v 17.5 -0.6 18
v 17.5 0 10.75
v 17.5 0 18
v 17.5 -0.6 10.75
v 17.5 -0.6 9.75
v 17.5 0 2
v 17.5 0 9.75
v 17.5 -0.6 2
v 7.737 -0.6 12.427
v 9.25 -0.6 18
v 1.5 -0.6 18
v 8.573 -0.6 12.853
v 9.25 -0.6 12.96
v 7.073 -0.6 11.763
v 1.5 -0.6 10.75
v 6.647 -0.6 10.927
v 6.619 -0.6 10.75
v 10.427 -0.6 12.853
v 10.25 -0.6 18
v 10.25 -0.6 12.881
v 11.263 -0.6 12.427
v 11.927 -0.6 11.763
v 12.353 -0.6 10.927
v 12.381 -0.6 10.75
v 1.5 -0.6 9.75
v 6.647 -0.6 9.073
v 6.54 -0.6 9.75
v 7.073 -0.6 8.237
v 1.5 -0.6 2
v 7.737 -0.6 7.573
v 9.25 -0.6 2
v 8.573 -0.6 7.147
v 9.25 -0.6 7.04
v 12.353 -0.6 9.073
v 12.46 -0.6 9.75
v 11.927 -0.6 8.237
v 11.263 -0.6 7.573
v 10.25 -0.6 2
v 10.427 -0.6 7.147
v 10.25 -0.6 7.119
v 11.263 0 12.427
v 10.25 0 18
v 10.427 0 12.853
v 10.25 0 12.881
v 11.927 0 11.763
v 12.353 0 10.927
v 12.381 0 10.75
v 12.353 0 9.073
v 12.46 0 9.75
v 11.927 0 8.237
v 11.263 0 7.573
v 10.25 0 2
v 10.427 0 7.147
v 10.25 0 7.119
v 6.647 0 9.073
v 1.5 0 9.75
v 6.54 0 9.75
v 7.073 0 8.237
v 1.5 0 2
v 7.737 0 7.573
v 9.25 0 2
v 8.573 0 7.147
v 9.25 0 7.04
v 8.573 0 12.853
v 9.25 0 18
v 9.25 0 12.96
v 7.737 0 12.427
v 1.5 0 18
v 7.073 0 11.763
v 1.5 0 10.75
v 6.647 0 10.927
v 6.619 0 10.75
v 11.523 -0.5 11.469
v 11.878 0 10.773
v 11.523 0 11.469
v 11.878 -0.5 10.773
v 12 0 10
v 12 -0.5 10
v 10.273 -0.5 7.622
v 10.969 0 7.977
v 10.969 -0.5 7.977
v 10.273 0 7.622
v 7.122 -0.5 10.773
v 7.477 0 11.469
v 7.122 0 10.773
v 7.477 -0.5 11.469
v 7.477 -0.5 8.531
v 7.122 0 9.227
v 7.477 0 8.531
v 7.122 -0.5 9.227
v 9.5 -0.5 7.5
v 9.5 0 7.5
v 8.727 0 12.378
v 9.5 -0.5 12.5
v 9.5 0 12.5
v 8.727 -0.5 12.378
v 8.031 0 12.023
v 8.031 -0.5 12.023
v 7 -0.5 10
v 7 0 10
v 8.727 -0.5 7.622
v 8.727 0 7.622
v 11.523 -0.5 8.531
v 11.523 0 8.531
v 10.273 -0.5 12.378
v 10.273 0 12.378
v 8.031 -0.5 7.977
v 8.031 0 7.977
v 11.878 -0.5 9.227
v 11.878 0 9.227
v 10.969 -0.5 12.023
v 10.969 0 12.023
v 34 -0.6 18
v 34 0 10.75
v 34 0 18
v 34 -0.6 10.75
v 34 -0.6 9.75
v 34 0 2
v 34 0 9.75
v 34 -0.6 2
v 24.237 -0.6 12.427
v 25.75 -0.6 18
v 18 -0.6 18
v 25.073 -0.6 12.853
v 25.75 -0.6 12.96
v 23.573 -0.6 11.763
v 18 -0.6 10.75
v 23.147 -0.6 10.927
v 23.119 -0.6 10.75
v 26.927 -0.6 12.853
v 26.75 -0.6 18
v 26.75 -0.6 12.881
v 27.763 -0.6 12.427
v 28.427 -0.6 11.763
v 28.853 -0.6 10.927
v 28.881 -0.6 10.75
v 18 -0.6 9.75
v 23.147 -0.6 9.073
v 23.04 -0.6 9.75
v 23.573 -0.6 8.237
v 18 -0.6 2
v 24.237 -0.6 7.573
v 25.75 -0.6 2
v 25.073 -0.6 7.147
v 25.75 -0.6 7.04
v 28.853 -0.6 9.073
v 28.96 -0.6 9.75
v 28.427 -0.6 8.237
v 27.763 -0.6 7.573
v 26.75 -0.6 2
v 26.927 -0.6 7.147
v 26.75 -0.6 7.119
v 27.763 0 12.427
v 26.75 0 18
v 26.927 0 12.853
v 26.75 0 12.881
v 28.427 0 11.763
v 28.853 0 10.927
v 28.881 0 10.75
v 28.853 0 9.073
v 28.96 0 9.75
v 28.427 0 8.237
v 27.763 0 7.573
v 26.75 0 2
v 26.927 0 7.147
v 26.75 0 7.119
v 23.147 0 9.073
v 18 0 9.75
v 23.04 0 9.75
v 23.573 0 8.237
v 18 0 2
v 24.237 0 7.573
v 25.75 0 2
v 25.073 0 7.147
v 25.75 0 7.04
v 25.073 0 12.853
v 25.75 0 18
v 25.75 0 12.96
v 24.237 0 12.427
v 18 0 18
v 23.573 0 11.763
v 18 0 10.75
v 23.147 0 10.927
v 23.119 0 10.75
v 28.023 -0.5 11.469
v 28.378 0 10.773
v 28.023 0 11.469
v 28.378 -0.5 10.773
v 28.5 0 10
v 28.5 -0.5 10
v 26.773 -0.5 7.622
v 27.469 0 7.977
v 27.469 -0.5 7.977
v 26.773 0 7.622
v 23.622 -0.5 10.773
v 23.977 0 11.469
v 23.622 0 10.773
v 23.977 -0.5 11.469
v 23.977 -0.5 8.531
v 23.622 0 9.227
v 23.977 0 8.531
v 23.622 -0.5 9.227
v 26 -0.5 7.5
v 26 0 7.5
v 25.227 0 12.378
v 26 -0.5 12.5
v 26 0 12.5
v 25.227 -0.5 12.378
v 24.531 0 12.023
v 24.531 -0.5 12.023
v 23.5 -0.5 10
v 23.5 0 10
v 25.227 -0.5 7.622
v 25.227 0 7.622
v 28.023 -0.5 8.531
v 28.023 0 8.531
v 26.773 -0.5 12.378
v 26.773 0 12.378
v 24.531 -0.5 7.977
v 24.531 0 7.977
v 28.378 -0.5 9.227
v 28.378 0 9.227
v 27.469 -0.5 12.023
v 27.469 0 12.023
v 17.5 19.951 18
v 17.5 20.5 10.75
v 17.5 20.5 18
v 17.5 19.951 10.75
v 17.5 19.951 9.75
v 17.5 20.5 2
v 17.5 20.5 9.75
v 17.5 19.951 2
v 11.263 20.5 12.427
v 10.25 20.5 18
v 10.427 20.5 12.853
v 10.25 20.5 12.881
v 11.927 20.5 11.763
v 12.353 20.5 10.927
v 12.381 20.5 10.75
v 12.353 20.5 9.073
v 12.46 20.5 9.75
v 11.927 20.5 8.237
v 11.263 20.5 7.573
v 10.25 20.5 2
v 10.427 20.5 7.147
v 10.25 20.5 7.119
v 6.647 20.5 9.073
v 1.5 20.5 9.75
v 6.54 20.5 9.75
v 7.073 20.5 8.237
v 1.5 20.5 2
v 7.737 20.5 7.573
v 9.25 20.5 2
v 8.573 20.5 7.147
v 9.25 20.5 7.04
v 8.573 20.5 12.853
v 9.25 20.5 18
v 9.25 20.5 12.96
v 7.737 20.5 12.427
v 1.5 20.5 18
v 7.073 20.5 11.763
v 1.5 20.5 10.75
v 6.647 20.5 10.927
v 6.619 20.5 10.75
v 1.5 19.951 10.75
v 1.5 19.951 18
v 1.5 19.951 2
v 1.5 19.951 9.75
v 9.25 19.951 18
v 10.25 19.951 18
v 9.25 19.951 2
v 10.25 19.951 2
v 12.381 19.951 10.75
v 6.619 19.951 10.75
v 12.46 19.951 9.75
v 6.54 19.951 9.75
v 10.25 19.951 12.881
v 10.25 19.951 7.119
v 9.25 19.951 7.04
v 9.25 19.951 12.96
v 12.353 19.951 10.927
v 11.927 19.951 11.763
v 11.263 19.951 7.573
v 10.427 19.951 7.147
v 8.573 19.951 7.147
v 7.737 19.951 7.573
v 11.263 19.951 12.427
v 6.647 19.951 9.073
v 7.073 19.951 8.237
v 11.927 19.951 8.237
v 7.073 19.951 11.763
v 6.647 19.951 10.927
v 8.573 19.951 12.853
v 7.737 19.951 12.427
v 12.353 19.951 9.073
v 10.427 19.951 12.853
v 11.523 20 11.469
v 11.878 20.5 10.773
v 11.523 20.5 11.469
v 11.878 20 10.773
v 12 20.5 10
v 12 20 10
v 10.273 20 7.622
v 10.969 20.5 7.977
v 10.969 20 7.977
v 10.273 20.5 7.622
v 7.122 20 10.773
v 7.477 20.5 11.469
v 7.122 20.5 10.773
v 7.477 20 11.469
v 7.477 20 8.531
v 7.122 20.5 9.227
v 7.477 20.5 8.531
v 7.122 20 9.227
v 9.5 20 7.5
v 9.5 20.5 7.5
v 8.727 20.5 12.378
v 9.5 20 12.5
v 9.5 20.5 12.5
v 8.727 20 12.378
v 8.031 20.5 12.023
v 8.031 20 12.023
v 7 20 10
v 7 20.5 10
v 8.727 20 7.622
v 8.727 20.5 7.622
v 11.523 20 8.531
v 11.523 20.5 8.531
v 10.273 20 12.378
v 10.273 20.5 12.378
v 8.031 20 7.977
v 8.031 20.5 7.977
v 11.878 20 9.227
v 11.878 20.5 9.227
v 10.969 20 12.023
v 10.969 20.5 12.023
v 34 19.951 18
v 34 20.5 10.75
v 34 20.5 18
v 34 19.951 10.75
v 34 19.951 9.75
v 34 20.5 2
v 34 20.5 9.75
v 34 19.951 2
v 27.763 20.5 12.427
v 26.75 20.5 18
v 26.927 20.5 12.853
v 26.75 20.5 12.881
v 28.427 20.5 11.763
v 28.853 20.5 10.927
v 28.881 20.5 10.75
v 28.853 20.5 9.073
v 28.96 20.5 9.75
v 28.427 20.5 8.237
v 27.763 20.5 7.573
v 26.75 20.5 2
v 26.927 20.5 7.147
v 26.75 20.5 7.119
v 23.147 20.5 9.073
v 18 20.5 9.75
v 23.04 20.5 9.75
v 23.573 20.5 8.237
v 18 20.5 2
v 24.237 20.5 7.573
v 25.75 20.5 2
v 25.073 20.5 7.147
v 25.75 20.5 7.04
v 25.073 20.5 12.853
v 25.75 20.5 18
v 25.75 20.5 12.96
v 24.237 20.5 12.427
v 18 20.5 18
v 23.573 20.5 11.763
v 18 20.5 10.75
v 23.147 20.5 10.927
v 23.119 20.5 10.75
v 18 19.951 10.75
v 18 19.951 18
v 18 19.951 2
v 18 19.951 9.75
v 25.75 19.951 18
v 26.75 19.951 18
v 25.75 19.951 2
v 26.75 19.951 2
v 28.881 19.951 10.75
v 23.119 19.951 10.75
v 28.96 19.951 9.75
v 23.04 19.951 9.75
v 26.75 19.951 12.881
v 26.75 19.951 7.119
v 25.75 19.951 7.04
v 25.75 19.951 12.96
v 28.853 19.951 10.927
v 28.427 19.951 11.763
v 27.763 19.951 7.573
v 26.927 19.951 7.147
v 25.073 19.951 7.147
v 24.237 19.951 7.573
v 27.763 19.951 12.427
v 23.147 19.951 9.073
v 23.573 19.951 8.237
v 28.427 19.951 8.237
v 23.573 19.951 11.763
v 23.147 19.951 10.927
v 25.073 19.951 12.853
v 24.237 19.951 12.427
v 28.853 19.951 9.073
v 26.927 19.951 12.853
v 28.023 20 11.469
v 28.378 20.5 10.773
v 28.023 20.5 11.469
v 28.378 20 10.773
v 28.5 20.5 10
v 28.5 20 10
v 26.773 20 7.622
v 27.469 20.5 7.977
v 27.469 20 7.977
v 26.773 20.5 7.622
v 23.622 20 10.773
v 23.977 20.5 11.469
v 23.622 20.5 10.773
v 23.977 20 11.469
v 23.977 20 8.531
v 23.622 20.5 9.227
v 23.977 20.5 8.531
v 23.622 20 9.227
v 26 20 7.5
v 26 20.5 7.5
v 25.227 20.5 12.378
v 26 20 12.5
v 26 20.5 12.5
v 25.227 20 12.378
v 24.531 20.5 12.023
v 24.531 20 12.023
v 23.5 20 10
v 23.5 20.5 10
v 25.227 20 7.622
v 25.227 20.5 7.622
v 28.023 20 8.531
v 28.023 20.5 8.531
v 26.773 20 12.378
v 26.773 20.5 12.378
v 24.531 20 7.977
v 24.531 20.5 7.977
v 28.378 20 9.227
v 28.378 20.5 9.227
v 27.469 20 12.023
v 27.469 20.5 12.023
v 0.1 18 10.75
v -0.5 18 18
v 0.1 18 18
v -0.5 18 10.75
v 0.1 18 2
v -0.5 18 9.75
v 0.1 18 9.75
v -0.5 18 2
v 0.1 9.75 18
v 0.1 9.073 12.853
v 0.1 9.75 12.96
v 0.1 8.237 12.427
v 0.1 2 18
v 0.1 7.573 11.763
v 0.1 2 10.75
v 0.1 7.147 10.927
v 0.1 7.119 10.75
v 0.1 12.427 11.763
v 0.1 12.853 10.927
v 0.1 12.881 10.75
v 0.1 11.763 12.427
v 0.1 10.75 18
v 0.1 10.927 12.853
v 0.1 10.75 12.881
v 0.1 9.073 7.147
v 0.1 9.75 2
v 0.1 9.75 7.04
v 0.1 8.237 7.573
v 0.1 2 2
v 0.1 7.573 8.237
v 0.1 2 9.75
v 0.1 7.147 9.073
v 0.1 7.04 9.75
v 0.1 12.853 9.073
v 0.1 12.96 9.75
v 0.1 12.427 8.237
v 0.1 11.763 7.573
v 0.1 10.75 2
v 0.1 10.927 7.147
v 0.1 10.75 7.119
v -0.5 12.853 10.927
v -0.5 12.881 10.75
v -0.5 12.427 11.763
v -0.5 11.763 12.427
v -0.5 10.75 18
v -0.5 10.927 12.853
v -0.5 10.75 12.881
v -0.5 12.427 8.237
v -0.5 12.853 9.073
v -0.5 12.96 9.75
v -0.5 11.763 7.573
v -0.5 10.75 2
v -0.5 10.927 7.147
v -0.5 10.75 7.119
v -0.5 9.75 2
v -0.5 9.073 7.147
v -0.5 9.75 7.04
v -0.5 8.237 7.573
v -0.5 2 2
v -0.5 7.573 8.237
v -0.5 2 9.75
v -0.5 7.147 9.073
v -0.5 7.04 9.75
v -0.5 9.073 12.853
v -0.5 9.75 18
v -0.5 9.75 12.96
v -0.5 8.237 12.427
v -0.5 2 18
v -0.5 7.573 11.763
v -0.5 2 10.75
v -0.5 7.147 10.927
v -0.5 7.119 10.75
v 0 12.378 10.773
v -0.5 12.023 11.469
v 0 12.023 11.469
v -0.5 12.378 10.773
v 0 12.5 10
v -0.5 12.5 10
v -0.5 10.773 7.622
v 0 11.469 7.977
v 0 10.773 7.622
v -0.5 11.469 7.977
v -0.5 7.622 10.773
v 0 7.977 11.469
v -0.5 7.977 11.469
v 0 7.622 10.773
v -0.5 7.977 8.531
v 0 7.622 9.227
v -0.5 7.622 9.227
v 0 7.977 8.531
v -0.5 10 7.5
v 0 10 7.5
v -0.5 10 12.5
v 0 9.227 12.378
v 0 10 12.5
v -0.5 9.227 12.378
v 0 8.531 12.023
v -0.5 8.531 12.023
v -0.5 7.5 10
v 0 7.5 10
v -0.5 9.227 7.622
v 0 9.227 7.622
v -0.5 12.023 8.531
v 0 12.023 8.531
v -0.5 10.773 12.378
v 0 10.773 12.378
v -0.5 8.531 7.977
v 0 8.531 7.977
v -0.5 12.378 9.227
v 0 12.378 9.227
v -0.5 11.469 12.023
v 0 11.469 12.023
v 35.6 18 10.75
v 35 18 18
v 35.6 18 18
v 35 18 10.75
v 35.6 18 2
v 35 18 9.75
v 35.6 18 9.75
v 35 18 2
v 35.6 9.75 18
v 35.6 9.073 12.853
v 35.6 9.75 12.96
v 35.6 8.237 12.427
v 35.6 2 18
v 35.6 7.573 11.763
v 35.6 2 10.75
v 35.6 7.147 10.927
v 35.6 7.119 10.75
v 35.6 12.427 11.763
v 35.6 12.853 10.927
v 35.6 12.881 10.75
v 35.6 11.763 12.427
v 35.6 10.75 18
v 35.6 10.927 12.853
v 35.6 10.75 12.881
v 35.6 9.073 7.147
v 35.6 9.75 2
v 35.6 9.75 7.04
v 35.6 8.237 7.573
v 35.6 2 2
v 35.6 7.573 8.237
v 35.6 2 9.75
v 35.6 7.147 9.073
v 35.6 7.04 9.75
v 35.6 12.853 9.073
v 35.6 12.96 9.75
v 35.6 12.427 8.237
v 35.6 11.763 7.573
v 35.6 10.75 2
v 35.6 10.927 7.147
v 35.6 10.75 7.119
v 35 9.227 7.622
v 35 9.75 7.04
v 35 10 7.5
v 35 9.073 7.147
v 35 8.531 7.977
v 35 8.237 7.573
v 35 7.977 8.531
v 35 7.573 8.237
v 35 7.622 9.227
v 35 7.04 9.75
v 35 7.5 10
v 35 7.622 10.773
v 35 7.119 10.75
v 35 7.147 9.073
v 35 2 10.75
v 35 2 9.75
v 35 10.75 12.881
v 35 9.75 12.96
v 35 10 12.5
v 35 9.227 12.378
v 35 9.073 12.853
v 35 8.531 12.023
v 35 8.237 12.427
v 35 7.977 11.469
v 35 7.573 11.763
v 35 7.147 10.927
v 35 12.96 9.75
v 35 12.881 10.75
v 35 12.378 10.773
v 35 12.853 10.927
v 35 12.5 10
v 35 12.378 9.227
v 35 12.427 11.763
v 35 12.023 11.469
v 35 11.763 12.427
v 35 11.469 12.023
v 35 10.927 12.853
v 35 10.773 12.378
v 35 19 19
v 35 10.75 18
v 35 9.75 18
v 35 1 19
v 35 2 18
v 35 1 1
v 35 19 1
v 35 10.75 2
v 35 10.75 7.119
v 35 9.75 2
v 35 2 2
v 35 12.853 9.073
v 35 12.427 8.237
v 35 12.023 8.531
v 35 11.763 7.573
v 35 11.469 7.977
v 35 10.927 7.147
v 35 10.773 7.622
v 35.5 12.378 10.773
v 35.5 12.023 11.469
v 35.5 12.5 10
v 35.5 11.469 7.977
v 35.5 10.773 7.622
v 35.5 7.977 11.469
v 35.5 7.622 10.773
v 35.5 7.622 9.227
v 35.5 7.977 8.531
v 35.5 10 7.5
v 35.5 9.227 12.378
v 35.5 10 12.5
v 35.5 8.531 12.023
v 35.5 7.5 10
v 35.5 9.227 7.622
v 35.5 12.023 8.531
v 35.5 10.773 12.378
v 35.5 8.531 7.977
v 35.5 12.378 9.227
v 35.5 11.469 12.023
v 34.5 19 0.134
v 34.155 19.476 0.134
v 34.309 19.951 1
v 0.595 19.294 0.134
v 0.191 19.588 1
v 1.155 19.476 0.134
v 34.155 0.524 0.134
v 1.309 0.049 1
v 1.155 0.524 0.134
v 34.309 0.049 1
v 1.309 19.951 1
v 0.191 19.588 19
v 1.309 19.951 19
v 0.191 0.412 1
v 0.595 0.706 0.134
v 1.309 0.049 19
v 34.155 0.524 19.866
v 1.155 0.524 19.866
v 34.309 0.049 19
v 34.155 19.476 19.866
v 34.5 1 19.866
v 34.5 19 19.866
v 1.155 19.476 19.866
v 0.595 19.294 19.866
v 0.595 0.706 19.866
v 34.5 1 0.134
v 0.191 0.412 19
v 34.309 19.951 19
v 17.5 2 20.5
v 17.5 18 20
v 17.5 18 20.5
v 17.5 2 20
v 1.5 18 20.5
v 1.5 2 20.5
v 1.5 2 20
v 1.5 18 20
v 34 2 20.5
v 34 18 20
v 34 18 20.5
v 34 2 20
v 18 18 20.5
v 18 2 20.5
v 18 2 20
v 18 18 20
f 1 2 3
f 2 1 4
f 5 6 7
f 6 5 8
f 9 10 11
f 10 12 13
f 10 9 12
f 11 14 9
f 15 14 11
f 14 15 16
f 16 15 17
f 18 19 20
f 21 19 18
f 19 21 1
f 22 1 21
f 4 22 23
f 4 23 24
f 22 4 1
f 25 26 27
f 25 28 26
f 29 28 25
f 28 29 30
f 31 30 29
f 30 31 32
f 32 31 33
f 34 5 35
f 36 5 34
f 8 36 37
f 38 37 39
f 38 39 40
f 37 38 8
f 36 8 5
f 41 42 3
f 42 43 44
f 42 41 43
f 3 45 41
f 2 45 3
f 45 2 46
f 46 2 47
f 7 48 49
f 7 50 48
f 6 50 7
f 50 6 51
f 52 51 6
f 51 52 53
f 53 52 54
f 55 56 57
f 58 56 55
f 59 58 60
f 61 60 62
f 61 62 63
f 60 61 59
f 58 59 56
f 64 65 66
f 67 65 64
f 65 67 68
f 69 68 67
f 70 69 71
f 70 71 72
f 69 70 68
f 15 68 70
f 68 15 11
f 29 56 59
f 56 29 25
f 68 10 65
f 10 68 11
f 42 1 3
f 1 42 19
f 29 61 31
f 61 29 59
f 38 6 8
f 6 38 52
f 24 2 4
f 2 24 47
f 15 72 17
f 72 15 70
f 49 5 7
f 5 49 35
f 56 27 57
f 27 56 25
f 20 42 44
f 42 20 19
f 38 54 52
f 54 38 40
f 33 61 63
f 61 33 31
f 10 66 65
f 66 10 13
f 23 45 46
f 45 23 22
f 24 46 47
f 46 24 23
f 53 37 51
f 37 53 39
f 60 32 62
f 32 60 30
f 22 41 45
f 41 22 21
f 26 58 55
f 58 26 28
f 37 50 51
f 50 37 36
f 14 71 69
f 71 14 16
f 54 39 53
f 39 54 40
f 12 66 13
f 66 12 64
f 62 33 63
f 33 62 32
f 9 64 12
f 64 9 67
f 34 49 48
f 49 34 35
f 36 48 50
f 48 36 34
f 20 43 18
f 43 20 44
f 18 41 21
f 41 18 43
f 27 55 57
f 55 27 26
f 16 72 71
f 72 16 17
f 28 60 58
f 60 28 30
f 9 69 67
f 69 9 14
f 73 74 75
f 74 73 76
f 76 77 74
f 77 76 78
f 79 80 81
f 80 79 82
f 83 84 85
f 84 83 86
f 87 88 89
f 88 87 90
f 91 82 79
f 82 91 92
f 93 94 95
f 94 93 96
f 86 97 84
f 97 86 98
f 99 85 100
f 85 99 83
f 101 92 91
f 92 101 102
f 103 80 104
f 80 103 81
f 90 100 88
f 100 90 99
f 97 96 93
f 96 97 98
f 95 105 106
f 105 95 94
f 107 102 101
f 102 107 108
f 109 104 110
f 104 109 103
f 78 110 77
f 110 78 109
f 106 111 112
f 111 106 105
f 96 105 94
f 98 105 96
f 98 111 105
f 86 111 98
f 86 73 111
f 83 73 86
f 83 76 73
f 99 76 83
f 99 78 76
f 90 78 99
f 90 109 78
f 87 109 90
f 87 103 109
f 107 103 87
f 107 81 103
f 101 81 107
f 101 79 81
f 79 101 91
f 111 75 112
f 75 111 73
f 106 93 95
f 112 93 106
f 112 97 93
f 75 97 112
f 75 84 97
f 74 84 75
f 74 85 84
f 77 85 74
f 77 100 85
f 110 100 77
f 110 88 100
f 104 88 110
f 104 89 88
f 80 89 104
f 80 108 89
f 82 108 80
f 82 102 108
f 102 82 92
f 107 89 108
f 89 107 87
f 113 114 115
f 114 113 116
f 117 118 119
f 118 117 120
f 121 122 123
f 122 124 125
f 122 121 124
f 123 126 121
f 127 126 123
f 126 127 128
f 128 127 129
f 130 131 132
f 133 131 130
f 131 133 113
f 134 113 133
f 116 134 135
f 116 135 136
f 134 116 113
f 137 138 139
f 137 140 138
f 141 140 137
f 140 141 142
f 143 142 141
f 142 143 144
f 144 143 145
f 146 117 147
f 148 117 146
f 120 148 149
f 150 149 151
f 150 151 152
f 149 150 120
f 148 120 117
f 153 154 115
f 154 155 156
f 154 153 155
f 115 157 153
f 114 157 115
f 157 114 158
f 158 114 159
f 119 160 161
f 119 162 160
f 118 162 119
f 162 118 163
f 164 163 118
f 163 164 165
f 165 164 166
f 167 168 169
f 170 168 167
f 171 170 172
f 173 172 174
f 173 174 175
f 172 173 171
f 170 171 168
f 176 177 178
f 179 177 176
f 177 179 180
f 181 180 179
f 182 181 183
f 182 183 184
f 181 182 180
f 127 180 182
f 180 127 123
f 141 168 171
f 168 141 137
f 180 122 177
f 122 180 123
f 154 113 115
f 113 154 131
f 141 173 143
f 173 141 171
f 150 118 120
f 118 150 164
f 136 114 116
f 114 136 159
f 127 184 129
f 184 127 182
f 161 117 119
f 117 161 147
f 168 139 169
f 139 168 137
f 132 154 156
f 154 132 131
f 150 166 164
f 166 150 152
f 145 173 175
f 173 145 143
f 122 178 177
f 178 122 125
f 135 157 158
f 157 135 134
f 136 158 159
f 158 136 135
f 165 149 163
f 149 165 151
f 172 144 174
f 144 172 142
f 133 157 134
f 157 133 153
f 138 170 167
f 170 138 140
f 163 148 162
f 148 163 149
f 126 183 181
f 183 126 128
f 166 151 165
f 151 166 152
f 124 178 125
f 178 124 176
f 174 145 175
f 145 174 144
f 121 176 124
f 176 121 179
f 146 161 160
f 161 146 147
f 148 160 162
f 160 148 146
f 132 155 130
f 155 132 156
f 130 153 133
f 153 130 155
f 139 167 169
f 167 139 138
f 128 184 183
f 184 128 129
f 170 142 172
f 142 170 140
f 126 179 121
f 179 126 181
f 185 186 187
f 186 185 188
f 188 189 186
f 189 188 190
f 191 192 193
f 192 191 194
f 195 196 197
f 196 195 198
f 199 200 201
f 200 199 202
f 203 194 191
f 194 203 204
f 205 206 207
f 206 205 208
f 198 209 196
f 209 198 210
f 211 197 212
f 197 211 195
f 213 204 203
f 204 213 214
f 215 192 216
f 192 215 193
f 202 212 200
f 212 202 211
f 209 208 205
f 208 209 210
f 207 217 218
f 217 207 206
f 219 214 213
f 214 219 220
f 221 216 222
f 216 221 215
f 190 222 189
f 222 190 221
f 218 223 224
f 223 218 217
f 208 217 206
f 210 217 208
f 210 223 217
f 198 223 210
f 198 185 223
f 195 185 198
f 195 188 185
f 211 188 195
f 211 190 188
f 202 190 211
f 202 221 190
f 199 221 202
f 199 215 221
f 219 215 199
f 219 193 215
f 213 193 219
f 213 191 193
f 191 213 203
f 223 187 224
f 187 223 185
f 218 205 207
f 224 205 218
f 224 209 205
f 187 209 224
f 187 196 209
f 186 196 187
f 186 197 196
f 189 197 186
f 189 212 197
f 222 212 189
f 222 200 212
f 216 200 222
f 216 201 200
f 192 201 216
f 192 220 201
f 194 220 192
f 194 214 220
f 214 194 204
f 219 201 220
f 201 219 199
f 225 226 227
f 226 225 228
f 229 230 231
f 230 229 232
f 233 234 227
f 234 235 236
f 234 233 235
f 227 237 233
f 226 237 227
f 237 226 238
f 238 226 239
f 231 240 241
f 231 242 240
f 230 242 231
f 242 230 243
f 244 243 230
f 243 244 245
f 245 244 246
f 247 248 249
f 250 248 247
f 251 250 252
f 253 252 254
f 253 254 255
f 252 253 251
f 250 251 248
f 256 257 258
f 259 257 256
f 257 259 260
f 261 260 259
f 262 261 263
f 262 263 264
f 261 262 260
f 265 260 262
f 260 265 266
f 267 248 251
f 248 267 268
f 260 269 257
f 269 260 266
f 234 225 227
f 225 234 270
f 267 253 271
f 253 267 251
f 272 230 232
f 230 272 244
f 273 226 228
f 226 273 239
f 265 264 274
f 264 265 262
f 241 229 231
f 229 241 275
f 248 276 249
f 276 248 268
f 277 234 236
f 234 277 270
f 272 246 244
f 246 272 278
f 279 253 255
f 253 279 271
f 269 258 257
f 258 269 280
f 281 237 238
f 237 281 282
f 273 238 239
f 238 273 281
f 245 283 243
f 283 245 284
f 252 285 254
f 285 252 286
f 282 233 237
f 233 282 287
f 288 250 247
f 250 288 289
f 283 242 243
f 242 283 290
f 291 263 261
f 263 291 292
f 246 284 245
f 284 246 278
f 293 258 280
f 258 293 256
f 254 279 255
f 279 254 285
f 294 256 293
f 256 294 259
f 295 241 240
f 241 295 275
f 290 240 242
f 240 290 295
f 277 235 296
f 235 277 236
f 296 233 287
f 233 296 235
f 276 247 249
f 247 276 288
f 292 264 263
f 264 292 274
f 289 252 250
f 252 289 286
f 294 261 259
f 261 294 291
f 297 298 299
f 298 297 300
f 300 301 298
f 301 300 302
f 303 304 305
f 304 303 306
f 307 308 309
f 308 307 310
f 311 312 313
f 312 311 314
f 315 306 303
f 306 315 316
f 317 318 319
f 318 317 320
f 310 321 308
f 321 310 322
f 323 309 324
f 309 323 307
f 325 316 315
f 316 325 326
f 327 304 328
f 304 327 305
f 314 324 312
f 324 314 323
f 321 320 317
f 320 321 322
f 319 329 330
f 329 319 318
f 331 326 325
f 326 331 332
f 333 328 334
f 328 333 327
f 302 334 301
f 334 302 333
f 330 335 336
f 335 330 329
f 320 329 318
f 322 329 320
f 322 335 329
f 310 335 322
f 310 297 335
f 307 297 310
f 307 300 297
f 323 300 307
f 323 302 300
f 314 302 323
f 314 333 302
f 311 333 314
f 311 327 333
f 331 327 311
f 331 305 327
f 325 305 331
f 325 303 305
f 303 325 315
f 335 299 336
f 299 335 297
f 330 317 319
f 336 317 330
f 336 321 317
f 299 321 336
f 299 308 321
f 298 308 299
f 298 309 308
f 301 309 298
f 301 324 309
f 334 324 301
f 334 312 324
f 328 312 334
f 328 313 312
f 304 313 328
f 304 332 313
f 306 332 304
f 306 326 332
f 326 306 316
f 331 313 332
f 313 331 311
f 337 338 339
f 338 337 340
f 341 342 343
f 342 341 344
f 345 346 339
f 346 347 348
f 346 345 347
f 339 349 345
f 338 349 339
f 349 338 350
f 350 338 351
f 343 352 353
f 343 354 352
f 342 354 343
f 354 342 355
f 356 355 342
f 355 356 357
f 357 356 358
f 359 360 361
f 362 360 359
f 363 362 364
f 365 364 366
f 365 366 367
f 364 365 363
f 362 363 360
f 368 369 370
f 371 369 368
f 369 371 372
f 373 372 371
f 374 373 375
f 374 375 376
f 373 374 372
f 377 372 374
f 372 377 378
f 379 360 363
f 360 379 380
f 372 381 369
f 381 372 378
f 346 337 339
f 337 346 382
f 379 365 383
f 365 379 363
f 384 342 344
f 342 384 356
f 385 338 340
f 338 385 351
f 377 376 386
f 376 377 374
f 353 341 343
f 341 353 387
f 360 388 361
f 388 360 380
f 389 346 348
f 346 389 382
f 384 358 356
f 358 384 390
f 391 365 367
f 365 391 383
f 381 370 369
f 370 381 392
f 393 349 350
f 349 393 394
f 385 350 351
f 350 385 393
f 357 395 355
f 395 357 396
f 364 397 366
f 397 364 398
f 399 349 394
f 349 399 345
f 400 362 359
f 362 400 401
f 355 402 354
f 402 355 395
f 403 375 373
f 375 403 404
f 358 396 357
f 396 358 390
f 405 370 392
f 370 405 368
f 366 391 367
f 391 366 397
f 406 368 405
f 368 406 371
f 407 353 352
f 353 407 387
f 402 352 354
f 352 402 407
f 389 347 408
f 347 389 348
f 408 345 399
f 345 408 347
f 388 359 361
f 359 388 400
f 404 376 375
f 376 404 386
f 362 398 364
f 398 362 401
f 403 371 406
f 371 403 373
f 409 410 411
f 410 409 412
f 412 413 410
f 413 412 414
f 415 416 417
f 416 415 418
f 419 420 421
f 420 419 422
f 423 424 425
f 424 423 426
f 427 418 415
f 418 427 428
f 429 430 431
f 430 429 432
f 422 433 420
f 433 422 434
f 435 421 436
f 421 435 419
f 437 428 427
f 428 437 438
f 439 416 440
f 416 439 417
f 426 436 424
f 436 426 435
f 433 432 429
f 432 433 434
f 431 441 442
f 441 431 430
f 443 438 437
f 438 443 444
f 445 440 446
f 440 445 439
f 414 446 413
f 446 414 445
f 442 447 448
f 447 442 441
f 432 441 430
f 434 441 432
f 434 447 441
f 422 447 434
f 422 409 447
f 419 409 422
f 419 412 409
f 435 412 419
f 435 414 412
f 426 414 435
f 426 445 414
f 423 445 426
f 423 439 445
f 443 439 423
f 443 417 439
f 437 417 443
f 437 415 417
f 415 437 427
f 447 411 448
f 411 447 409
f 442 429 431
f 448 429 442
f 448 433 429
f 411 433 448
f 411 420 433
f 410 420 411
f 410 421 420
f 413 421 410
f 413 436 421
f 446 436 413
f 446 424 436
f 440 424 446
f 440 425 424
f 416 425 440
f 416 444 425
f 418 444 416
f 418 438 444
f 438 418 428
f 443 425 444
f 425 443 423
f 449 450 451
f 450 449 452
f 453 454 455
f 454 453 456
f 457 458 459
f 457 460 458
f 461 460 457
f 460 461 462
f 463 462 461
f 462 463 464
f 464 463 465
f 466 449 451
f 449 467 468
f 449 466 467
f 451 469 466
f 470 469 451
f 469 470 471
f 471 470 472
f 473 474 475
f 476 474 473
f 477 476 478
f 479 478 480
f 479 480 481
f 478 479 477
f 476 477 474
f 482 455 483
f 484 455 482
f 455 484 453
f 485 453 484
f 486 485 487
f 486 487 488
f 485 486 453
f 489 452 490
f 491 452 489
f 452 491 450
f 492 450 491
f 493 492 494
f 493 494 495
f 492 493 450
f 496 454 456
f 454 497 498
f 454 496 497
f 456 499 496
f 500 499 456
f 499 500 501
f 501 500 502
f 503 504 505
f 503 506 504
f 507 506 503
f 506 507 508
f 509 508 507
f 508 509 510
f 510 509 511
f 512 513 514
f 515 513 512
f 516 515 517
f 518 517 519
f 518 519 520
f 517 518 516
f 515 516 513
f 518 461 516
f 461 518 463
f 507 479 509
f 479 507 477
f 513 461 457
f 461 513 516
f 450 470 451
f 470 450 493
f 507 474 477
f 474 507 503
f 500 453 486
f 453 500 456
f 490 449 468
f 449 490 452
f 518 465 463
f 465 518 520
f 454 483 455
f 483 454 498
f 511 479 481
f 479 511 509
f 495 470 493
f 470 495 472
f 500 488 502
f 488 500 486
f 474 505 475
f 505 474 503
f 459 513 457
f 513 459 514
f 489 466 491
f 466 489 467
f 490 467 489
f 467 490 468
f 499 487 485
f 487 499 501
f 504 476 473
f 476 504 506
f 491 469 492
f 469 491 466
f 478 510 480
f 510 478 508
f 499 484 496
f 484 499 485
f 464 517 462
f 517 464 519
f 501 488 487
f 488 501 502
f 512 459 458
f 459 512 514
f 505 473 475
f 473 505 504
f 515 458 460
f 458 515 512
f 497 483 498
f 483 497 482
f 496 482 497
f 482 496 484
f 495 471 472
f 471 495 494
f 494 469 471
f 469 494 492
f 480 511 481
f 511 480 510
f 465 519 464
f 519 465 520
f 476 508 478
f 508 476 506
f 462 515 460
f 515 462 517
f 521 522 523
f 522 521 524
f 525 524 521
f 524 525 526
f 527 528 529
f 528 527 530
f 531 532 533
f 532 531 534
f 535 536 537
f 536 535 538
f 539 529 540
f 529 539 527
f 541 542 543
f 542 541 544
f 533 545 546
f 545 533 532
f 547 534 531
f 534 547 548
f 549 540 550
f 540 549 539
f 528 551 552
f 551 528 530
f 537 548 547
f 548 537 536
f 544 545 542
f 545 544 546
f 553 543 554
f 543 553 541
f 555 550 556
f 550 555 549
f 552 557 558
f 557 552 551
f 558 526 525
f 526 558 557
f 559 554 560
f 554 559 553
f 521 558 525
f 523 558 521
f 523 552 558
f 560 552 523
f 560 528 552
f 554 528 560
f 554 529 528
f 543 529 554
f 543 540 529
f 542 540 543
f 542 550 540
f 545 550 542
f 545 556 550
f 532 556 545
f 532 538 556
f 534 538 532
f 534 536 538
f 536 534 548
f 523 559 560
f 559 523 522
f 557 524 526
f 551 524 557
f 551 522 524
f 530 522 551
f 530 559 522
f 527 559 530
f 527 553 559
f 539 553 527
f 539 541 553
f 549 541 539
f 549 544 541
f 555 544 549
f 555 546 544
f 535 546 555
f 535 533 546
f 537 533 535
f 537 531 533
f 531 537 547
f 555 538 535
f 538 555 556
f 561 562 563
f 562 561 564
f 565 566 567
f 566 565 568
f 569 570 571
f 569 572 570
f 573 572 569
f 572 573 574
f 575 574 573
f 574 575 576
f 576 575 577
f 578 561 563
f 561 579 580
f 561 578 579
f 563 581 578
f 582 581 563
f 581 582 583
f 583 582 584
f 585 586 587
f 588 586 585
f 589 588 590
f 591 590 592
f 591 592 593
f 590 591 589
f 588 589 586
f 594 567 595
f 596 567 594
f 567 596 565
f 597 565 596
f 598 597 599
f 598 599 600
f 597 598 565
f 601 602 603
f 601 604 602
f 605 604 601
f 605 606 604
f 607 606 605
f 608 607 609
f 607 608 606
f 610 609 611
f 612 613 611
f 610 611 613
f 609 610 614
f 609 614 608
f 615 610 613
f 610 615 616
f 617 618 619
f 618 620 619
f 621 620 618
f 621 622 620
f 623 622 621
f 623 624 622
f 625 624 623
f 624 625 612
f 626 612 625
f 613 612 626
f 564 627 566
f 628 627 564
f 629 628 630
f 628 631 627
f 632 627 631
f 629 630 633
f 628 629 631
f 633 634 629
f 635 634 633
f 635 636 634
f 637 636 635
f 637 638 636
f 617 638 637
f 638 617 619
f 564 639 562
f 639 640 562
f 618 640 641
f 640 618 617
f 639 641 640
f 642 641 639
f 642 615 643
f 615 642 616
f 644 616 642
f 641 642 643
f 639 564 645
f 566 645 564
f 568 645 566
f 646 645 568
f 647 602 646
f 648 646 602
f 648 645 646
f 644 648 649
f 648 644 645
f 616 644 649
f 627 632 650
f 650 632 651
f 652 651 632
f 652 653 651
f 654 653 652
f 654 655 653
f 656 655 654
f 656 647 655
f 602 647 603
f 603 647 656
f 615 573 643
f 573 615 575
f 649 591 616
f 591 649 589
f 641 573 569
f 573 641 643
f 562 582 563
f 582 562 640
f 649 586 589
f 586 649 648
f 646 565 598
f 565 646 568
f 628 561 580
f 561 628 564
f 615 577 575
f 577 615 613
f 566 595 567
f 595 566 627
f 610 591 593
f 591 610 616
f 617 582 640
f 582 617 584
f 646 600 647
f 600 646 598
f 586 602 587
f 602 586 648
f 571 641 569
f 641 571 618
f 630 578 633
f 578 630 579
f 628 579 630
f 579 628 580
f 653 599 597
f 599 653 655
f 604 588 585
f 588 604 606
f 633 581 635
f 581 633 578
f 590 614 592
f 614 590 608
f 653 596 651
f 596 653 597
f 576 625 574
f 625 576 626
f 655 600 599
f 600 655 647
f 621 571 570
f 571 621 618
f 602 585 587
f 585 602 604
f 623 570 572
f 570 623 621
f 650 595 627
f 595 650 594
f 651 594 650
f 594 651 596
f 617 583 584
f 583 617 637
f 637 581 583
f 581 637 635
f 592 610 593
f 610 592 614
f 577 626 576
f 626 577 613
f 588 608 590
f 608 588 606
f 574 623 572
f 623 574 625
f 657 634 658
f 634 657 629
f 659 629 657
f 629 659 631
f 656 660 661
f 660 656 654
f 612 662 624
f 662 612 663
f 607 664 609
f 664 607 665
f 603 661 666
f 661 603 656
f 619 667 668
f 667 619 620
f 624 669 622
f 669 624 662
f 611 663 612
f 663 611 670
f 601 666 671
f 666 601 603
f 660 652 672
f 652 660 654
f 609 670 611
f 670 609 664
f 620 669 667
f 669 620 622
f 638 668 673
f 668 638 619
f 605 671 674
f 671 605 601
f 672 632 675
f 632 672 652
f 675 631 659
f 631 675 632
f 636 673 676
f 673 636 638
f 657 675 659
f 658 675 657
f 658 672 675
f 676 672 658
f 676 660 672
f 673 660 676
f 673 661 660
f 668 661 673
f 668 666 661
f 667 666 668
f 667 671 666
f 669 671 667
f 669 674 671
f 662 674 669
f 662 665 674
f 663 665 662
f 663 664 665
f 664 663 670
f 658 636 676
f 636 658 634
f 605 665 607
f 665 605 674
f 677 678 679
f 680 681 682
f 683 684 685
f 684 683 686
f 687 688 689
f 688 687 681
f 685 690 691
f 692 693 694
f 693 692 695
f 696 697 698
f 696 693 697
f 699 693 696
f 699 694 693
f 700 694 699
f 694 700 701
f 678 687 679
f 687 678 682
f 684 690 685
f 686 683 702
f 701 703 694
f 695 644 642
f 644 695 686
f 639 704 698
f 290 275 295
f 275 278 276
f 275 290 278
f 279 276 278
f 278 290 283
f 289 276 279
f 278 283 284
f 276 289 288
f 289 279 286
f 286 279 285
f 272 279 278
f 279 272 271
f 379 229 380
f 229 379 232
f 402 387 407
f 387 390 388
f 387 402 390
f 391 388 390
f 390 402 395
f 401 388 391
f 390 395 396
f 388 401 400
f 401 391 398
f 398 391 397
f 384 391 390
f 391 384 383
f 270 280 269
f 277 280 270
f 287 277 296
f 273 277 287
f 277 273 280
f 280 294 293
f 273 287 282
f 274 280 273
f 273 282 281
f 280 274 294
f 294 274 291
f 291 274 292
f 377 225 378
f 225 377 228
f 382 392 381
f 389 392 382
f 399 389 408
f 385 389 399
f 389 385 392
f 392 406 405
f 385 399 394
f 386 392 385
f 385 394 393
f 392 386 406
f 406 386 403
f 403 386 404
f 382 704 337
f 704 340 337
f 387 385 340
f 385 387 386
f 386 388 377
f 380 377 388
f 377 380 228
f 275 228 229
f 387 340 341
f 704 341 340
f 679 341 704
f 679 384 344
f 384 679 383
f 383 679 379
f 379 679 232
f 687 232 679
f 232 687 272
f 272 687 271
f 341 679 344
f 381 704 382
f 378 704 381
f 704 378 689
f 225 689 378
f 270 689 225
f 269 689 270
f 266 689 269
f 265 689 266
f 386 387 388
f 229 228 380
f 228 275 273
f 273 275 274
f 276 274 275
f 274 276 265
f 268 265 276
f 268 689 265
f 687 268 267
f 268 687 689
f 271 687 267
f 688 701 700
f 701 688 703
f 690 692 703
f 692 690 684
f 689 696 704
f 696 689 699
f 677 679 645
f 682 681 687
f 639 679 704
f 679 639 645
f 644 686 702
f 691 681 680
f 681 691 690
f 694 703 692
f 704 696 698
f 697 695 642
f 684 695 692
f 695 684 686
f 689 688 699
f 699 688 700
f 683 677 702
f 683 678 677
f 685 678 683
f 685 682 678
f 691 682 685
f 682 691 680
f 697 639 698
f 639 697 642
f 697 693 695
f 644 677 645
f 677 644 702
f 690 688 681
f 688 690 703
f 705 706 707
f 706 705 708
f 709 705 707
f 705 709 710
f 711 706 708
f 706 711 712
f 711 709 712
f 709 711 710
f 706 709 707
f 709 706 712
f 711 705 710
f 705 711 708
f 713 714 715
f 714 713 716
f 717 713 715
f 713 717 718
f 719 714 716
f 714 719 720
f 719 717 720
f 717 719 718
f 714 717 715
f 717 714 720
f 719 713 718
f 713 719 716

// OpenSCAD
module panel(x,y,z)
{
    d=0.5;
    s=8;
    translate([x,y,z]) rotate([90,0,0]) {
    difference() {
        cube([2*s,2*s,0.6]);
        translate([0,s-d/2,0]) cube([2*s,1,1]);
        translate([s-d/2,0,0]) cube([1,2*s,1]);
        translate([s,s,0]) cylinder(h=1,r=3,$fn=20);
    }
    translate([s,s,0]) cylinder(h=0.5,r=2.5,$fn=20);
    }
}

l=32;
w=16;
h=16;
t=2;
hull() {
    translate([1,1,1]) sphere(r=1);
    translate([1,1,h+t+1]) sphere(r=1);
    translate([l+t,1,h+t+1]) sphere(r=1);
    translate([l+t,1,1]) sphere(r=1);
    translate([1,w+t+1,1]) sphere(r=1);
    translate([1,w+t+1,h+t+1]) sphere(r=1);
    translate([l+t,w+t+1,h+t+1]) sphere(r=1);
    translate([l+t,w+t+1,1]) sphere(r=1);
}
panel(1.5,0,2);
panel(18,0,2);
panel(1.5,20.5,2);
panel(18,20.5,2);

translate([-0.5,2,2]) rotate([0,0,90]) panel(0,0,0);
translate([35,2,2]) rotate([0,0,90]) panel(0,0,0);
translate([1.5,2,20]) cube([16,16,0.5]);
translate([18,2,20]) cube([16,16,0.5]);
